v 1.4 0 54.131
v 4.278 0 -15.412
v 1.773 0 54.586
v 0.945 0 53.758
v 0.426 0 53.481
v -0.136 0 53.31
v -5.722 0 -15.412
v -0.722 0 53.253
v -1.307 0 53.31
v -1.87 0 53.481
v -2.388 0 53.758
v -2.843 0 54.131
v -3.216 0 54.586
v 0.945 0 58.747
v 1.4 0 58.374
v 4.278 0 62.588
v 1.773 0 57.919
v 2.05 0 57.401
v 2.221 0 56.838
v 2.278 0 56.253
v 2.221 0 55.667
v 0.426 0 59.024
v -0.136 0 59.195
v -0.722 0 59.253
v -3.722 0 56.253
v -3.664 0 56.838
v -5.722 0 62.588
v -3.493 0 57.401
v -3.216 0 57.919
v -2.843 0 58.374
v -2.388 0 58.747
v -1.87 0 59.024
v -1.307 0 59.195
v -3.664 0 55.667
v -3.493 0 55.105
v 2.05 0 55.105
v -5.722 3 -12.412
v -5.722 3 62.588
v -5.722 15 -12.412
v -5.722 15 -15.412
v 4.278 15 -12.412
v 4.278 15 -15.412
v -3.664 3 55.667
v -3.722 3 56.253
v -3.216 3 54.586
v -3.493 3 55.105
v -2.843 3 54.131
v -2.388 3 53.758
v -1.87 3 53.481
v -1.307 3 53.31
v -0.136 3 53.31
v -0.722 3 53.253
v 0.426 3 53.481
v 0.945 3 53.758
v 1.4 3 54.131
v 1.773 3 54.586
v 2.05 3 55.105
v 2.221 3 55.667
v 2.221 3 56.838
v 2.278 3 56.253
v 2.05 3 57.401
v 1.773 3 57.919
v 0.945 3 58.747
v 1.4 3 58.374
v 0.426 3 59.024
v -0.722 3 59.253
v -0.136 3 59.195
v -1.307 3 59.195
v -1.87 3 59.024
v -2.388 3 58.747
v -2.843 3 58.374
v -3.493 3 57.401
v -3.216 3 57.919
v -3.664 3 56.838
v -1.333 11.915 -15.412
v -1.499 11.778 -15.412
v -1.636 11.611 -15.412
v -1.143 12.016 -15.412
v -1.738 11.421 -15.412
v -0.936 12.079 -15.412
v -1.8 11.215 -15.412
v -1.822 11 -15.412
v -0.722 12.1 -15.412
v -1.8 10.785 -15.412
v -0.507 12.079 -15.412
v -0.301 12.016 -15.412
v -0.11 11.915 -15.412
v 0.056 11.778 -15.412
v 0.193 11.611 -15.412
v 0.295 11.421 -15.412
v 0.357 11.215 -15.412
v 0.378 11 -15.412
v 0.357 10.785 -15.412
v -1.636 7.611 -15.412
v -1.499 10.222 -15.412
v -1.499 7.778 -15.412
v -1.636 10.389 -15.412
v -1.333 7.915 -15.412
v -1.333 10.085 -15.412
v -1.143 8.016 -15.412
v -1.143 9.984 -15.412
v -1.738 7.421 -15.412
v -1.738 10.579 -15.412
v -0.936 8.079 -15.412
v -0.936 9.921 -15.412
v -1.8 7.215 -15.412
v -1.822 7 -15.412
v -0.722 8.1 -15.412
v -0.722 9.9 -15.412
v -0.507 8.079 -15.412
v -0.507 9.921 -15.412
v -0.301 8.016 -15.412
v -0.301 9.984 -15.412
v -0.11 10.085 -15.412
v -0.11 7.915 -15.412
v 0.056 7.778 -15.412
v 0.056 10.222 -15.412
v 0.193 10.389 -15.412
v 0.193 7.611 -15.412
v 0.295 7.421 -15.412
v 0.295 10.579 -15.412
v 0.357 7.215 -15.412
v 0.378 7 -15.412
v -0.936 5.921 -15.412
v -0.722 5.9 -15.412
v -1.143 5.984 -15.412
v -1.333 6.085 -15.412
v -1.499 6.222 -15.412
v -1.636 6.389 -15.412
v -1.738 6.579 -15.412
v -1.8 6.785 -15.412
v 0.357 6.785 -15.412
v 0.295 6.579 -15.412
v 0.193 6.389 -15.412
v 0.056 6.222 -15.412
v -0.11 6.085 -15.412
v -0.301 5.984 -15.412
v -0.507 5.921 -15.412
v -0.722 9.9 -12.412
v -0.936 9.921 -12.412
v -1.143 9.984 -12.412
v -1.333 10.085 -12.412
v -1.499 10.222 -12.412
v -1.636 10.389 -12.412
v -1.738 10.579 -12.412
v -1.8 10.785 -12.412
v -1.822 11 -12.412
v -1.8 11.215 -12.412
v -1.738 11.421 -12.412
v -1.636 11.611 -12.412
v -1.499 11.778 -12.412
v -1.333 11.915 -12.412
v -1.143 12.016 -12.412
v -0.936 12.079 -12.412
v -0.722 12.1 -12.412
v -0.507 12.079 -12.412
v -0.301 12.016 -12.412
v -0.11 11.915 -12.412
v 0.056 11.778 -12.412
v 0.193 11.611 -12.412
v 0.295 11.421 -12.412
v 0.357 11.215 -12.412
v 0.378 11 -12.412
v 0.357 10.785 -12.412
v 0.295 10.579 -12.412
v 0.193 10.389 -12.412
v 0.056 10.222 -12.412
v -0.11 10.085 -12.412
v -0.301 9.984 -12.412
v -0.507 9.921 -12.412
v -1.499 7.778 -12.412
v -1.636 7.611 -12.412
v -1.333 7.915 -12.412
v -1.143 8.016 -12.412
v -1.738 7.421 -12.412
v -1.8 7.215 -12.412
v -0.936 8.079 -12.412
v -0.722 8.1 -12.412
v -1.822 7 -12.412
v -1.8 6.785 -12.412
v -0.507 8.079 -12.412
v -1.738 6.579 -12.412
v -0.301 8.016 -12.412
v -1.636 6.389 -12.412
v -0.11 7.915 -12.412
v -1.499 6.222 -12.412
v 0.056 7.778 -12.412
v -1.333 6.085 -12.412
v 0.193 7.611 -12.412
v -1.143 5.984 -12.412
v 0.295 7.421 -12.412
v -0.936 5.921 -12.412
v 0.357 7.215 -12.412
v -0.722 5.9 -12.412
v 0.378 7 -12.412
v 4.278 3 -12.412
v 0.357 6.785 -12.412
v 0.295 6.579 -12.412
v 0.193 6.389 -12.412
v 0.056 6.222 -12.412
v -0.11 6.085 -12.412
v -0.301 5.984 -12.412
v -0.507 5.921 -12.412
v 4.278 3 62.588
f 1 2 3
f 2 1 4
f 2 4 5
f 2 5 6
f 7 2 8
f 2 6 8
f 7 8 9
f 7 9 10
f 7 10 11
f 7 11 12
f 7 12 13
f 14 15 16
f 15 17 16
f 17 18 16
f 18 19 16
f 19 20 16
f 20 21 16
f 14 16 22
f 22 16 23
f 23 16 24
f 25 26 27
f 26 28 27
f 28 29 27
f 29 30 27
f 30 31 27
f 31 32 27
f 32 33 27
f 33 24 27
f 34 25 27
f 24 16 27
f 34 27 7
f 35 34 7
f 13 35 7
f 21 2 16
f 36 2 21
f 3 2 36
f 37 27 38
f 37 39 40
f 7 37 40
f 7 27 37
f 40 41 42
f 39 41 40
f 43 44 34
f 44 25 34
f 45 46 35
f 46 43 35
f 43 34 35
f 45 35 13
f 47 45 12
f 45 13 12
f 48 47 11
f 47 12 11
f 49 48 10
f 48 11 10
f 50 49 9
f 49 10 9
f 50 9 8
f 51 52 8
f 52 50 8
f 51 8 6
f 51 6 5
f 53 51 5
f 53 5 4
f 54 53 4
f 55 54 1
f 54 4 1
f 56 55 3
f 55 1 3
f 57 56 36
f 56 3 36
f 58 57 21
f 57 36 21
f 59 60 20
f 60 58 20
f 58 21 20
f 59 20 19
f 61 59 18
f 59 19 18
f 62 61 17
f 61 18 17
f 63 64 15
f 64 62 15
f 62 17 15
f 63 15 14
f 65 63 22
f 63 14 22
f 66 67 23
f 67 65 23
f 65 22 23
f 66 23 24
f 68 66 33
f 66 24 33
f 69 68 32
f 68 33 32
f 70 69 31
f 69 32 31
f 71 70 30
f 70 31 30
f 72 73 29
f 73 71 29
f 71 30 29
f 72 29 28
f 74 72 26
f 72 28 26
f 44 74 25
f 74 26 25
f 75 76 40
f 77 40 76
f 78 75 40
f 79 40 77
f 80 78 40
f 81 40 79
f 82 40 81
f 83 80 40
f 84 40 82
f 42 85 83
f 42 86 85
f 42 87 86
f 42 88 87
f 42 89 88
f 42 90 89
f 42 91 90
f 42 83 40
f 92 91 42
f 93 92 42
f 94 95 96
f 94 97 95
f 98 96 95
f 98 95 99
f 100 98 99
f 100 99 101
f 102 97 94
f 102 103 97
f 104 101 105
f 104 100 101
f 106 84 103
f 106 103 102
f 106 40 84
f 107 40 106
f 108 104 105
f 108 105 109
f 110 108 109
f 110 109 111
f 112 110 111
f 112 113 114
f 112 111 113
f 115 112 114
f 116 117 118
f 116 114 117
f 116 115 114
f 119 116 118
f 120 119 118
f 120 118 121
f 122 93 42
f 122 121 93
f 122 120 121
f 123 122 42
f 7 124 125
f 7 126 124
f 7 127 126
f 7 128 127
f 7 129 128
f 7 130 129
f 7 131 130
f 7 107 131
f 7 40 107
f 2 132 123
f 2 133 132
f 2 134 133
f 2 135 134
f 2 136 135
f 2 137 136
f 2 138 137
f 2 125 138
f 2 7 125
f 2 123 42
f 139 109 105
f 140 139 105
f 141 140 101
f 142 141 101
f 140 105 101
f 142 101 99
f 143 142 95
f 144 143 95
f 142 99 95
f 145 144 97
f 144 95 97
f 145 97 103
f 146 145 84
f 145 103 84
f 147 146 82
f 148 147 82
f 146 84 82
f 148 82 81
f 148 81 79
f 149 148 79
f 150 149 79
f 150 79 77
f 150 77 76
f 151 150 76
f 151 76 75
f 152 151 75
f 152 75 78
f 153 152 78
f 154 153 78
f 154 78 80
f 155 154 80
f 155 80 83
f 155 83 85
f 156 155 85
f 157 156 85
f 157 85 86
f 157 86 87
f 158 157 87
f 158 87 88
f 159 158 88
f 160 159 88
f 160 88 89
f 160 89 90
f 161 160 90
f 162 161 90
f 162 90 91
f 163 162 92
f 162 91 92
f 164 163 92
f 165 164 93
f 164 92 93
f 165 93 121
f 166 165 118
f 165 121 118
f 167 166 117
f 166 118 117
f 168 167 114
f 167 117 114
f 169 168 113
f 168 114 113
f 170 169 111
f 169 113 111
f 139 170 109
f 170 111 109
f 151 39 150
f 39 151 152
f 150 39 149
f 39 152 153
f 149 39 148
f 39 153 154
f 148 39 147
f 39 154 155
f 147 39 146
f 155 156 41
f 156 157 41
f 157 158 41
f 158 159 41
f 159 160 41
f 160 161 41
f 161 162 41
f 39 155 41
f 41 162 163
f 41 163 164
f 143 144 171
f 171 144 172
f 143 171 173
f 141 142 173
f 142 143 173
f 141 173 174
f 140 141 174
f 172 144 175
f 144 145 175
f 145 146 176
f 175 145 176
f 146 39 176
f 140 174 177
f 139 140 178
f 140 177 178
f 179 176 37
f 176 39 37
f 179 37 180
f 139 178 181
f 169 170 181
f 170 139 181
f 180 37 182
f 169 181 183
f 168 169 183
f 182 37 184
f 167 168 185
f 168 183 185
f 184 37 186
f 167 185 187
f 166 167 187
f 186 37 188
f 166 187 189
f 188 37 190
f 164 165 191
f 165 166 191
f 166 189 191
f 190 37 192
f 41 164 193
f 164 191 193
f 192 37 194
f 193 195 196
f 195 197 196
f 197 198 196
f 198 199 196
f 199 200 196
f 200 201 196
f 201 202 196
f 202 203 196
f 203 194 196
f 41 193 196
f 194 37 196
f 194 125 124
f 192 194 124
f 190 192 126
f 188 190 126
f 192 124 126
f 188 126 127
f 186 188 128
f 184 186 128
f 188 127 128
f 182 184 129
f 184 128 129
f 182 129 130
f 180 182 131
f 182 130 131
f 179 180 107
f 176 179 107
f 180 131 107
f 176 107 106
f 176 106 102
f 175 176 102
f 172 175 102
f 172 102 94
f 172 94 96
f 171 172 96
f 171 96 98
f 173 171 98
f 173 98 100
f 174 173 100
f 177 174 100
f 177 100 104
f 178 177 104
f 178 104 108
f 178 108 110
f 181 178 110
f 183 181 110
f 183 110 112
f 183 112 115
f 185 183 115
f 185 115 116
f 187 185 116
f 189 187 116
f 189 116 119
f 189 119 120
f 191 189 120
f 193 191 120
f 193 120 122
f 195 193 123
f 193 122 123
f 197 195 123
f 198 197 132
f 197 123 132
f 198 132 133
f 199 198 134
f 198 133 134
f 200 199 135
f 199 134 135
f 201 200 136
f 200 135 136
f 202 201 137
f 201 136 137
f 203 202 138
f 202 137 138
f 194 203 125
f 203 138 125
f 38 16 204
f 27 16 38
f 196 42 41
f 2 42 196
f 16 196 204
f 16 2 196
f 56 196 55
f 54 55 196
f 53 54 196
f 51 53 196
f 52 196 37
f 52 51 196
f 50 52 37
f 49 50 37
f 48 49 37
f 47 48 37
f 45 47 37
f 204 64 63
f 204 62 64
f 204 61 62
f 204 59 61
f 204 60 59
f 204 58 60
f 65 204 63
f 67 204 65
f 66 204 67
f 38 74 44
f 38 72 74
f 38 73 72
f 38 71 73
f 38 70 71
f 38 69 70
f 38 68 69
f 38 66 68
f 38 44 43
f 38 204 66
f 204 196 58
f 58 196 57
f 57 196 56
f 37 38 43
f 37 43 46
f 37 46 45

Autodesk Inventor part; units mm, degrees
ref_plane "YZ Plane" through (0, 0, 0) normal (1, 0, 0) x (0, 1, 0)
ref_plane "XZ Plane" through (0, 0, 0) normal (0, 1, 0) x (-1, 0, 0)
ref_plane "XY Plane" through (0, 0, 0) normal (0, 0, 1) x (1, 0, 0)
sketch "Sketch1" plane through (0, 0, 0) normal (0, 1, 0) x (-1, 0, 0)
  line L0 (-4.2784, 62.5876) -> (5.7216, 62.5876)
  line L1 (5.7216, 62.5876) -> (5.7216, -15.4124)
  line L2 (5.7216, -15.4124) -> (-4.2784, -15.4124)
  line L3 (-4.2784, -15.4124) -> (-4.2784, 62.5876)
  line L4 (-4.2784, -15.4124) -> (5.7216, -15.4124)
  line L5 (5.7216, -15.4124) -> (5.7216, -12.4124)
  line L6 (5.7216, -12.4124) -> (-4.2784, -12.4124)
  line L7 (-4.2784, -12.4124) -> (-4.2784, -15.4124)
  circle A0 centre (0.7216, 56.2526) radius 3
  point P0 (0, 0)
  dimension "d0" = 10
  dimension "d1" = 78
  dimension "d2" = 6.335
  dimension "d3" = 3
  dimension "d16" = 6
extrude "Extrusion1" add sketch "Sketch1" along normal blind 3 contours L0 L1 L6 L3
extrude "Extrusion2" add sketch "Sketch1" along normal blind 15 contours L6 L1 L2 L3
sketch "Sketch2" plane through (-5.7216, 3, -12.4124) normal (0, 0, 1) x (1, 0, 0)
  line L0 (0, 0) -> (0, 12) projected
  line L1 (0, 0) -> (10, 0) projected
  line L2 (5, 4) -> (5, 8) construction
  point P0 (5.7216, -3)
  point P1 (5, 0)
  point P2 (0, 6)
  point P3 (5, 6)
  dimension "d8" = 4
hole "Hole1" at (-0.7216, 11, -12.4124) at (-0.7216, 7, -12.4124) direction (0, 0, -1) diameter 2.2 end through all
properties part number "ALPHA_001158_Electrode8-mountbracket"
